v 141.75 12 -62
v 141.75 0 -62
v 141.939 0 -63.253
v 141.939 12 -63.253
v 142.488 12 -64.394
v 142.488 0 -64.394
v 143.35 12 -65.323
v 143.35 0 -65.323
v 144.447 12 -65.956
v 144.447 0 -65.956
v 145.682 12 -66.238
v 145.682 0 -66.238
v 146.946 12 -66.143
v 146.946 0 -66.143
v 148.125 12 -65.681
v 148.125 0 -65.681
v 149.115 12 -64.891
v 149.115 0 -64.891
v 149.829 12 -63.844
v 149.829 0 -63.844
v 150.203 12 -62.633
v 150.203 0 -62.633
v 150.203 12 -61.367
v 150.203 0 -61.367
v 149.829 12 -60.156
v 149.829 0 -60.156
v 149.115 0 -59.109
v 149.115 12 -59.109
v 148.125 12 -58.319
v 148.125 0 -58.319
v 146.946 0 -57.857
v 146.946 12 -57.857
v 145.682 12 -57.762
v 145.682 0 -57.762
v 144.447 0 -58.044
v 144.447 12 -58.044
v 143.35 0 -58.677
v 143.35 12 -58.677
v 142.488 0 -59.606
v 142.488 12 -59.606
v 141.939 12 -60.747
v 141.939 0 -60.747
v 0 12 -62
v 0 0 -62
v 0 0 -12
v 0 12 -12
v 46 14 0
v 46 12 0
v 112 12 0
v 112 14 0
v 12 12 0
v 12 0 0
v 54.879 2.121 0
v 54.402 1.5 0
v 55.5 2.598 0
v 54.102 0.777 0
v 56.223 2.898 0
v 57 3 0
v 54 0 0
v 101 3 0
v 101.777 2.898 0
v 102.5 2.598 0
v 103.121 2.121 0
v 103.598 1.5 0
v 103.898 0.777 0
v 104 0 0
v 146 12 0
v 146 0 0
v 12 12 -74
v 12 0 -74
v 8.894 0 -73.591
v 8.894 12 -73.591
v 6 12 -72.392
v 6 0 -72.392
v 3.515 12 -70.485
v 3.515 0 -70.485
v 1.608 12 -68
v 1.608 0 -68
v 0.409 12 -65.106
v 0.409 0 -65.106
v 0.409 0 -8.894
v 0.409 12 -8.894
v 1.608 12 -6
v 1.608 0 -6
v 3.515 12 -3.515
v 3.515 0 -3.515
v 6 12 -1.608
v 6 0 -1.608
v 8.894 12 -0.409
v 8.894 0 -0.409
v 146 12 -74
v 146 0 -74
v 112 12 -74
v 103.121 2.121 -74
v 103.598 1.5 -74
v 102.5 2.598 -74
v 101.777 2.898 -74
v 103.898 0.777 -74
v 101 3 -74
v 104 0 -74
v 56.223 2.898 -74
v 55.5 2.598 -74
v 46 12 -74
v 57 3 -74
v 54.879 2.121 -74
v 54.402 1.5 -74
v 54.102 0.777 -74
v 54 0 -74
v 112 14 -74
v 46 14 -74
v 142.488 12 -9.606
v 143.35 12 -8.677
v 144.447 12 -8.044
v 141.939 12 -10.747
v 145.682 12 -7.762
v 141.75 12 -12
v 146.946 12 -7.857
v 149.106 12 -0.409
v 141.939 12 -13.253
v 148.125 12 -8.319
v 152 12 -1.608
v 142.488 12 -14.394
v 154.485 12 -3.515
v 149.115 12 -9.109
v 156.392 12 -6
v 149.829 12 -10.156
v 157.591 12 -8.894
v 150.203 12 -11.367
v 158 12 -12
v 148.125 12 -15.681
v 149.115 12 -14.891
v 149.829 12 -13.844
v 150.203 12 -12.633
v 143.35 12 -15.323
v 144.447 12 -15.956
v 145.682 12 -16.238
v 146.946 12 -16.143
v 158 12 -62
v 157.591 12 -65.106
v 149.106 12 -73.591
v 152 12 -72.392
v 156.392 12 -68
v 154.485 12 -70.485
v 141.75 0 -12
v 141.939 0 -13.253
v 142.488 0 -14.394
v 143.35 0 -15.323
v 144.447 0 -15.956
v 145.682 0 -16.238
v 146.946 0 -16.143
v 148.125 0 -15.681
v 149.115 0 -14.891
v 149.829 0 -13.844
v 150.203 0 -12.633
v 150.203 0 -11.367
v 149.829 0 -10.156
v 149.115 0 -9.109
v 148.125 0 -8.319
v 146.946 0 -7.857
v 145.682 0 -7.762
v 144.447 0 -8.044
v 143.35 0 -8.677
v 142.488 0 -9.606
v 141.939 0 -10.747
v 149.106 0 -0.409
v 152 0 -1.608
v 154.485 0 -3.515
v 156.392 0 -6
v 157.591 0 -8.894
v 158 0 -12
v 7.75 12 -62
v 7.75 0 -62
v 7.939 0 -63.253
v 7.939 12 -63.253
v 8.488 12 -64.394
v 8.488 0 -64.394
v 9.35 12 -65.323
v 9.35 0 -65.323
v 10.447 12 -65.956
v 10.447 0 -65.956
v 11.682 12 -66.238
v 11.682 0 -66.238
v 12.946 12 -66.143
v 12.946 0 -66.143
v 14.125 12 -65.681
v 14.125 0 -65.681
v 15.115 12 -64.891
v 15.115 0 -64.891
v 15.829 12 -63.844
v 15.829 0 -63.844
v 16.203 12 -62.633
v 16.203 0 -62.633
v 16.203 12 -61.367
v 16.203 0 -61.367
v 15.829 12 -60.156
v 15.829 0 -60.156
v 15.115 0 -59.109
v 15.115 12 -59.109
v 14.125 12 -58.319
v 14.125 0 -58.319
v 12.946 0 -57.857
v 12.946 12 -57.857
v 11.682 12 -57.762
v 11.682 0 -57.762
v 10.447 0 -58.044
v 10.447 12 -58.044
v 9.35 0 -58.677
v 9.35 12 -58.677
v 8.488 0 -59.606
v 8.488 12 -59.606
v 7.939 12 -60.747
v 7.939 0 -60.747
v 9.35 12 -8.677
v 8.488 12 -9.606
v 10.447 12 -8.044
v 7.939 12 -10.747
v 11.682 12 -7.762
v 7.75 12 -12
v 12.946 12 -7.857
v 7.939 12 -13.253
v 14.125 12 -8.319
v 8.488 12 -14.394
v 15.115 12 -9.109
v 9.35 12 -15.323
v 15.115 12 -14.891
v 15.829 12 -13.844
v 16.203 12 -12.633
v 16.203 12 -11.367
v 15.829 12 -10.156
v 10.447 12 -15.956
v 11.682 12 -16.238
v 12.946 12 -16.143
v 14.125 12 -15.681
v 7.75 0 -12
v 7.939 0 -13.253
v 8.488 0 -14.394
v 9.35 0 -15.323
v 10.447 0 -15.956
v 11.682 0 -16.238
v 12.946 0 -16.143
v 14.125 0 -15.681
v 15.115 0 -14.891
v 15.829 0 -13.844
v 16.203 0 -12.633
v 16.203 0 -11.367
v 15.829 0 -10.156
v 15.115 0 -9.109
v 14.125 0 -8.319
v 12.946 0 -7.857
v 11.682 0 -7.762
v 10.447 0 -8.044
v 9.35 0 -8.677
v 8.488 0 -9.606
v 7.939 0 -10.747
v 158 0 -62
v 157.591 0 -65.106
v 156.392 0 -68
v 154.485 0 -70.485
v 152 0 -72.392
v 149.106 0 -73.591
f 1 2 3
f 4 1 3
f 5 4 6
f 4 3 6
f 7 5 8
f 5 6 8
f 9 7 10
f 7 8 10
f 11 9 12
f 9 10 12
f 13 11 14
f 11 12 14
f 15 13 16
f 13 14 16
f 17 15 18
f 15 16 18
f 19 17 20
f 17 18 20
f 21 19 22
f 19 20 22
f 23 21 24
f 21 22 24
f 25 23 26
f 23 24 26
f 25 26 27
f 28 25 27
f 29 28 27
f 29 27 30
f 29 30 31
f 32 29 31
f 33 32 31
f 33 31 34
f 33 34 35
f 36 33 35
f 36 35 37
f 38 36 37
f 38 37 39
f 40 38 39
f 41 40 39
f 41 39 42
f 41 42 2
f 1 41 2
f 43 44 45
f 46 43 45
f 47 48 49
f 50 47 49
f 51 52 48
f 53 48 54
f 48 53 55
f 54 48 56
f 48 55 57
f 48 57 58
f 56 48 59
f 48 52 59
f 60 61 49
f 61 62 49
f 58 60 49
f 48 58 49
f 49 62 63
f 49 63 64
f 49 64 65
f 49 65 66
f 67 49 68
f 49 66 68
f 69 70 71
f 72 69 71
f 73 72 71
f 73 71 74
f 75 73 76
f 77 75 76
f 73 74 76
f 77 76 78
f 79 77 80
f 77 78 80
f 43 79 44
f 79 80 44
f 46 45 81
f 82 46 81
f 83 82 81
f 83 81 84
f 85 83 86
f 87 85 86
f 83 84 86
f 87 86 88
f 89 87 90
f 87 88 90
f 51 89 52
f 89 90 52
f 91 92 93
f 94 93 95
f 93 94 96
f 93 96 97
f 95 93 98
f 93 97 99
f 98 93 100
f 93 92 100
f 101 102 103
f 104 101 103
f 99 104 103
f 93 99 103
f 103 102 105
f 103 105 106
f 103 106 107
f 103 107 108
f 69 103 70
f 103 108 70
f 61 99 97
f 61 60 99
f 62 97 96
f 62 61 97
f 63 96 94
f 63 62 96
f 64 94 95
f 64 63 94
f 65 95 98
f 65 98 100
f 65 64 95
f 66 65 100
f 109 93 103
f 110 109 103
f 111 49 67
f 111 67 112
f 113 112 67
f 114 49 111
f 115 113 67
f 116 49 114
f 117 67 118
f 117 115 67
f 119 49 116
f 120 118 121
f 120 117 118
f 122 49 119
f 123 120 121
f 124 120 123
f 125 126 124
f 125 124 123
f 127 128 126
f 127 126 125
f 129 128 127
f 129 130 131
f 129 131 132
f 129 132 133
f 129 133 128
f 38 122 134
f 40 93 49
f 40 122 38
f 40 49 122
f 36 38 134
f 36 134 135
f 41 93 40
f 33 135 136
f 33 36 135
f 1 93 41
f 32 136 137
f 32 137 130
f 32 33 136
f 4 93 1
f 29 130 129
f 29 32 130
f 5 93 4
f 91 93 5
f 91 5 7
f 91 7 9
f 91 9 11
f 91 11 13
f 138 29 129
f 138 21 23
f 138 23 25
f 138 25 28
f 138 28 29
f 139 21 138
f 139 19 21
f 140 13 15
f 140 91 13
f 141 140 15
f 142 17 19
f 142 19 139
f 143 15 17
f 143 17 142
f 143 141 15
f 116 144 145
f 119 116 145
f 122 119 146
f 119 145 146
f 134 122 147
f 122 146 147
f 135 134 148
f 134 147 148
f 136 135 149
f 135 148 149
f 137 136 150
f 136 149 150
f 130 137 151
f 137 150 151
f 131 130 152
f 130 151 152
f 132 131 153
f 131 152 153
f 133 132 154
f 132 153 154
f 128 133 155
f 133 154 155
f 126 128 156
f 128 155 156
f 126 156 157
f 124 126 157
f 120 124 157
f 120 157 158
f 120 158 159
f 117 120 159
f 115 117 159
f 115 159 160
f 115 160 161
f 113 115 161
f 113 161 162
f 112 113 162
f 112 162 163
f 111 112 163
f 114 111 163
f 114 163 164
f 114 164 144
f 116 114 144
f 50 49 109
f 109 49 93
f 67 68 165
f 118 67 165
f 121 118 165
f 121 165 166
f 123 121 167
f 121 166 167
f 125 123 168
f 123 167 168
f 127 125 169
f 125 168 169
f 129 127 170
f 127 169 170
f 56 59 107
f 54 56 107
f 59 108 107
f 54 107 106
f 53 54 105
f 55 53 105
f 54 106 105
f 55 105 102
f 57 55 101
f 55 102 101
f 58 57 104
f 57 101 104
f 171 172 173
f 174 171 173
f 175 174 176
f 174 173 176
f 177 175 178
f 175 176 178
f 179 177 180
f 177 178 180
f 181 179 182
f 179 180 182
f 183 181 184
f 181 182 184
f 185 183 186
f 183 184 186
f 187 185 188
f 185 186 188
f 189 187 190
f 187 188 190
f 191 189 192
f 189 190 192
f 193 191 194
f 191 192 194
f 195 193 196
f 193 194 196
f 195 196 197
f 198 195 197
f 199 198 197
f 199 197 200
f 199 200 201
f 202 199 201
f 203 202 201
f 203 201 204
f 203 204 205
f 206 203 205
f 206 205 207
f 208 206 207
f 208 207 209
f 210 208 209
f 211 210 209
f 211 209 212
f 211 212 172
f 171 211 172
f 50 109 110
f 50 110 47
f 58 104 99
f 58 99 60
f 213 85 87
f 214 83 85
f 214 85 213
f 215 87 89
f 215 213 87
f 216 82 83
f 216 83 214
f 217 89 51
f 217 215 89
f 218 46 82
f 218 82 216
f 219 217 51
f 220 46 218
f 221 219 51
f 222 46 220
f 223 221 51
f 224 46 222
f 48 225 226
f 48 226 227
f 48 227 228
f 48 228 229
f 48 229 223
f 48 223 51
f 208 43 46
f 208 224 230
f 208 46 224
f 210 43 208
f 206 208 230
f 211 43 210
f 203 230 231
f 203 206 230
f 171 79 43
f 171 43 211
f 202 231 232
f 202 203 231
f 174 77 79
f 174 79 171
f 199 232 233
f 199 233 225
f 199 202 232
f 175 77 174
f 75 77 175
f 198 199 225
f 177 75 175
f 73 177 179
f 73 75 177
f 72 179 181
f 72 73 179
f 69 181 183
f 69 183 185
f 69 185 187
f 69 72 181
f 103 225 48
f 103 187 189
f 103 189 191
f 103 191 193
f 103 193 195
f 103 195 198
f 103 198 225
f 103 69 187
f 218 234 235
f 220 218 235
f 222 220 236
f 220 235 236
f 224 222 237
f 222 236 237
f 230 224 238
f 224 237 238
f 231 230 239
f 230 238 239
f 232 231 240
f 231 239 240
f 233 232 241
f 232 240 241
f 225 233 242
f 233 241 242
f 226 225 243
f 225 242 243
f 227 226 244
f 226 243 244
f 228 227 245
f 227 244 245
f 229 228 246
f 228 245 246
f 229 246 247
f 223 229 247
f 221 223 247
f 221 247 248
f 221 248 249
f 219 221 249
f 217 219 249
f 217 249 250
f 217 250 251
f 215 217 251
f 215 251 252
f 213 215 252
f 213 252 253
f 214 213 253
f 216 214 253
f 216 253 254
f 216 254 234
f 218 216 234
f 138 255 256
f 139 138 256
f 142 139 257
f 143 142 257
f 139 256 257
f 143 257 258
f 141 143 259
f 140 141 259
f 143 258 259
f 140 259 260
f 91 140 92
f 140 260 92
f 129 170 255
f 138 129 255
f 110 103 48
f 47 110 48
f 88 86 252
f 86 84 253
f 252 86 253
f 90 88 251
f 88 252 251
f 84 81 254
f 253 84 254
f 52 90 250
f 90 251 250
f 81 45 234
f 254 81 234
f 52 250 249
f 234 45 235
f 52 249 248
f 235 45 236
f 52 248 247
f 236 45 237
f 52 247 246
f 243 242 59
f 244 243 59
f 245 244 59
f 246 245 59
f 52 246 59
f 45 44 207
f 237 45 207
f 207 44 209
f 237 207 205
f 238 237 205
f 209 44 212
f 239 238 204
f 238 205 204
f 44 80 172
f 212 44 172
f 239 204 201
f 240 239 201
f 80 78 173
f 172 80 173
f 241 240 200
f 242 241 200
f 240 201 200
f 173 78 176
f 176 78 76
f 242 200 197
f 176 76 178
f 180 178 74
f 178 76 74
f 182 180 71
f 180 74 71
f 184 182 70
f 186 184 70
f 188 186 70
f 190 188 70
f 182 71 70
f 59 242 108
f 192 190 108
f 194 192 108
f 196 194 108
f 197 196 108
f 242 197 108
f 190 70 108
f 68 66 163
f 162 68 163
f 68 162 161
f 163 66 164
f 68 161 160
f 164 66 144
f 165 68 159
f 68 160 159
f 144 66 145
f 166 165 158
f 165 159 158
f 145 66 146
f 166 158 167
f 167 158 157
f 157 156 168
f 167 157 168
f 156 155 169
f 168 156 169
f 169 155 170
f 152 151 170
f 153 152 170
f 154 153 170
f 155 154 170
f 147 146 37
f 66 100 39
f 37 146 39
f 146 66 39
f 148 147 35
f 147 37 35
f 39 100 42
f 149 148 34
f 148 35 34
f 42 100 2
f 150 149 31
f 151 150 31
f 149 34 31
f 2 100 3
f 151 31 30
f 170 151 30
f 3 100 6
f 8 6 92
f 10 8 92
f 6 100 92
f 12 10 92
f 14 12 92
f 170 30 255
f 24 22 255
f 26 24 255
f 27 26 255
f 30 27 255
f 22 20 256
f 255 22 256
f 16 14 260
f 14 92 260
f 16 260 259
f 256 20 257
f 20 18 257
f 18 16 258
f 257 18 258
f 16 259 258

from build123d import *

# Parameters (mm, degrees)
BOSS_EXTRUDE2_DEPTH              = 12
BOSS_EXTRUDE3_DEPTH              = 2
CUT_EXTRUDE1_DEPTH               = 3
FILLET1_R                        = 3
TAP_DRILL_FOR_M10X1_5_TAP1_D     = 8.5
TAP_DRILL_FOR_M10X1_5_TAP1_DEPTH = 12.55
TAP_DRILL_FOR_M10X1_5_TAP1_TIP   = 4.25


with BuildPart() as part:
    # Sketch2 → Boss-Extrude2 (new body)
    with BuildSketch(Plane(origin=(0, 0, 0), x_dir=(1, 0, 0), z_dir=(0, 1, 0))):
        with BuildLine():
            Line((12, 0), (146, 0))
            ThreePointArc((146, 0), (154.485281374, 3.514718626), (158, 12))
            Line((158, 12), (158, 62))
            ThreePointArc((158, 62), (154.485281374, 70.485281374), (146, 74))
            Line((146, 74), (12, 74))
            ThreePointArc((12, 74), (3.514718626, 70.485281374), (0, 62))
            Line((0, 62), (0, 12))
            ThreePointArc((0, 12), (3.514718626, 3.514718626), (12, 0))
        make_face()
    extrude(amount=BOSS_EXTRUDE2_DEPTH)

    # 3DSketch2 → Boss-Extrude3 (add)
    with BuildSketch(Plane(origin=(112, 12, 0), x_dir=(-0.6656148469584017, 0, -0.7462954344685109), z_dir=(0, -1, 0))):
        Polygon((0, 0), (55.225862151, 49.255498675), (99.15644205, 0), (43.930579899, -49.255498675), align=None)
    extrude(amount=-BOSS_EXTRUDE3_DEPTH)

    # 3DSketch3 → Cut-Extrude1 (cut)
    with BuildSketch(Plane(origin=(104, 0, -74), x_dir=(-0.5598574112779868, 0, 0.8285889686914202), z_dir=(0, -1, 0))):
        Polygon((0, 0), (61.315583683, -41.429448435), (89.308454247, 0), (27.992870564, 41.429448435), align=None)
    extrude(amount=-CUT_EXTRUDE1_DEPTH, mode=Mode.SUBTRACT)

    # Fillet1
    fillet1_edges = [part.edges().sort_by_distance(p)[0] for p in [
        (104, 3, -37),
        (54, 3, -37),
    ]]
    fillet(fillet1_edges, radius=FILLET1_R - 0.0001)  # a hair under: the kernel refuses the full size

    # Tap Drill for M10x1.5 Tap1
    with Locations(Plane(origin=(0, 12, 0), x_dir=(1, 0, 0), z_dir=(0, 1, 0))):
        with Locations((146, 12), (146, 62), (12, 12), (12, 62)):
            Hole(TAP_DRILL_FOR_M10X1_5_TAP1_D / 2, depth=TAP_DRILL_FOR_M10X1_5_TAP1_DEPTH)
            with Locations((0, 0, -(TAP_DRILL_FOR_M10X1_5_TAP1_DEPTH + TAP_DRILL_FOR_M10X1_5_TAP1_TIP / 2))):  # 90° drill point
                Cone(0, TAP_DRILL_FOR_M10X1_5_TAP1_D / 2, TAP_DRILL_FOR_M10X1_5_TAP1_TIP, mode=Mode.SUBTRACT)


solid = part.part
